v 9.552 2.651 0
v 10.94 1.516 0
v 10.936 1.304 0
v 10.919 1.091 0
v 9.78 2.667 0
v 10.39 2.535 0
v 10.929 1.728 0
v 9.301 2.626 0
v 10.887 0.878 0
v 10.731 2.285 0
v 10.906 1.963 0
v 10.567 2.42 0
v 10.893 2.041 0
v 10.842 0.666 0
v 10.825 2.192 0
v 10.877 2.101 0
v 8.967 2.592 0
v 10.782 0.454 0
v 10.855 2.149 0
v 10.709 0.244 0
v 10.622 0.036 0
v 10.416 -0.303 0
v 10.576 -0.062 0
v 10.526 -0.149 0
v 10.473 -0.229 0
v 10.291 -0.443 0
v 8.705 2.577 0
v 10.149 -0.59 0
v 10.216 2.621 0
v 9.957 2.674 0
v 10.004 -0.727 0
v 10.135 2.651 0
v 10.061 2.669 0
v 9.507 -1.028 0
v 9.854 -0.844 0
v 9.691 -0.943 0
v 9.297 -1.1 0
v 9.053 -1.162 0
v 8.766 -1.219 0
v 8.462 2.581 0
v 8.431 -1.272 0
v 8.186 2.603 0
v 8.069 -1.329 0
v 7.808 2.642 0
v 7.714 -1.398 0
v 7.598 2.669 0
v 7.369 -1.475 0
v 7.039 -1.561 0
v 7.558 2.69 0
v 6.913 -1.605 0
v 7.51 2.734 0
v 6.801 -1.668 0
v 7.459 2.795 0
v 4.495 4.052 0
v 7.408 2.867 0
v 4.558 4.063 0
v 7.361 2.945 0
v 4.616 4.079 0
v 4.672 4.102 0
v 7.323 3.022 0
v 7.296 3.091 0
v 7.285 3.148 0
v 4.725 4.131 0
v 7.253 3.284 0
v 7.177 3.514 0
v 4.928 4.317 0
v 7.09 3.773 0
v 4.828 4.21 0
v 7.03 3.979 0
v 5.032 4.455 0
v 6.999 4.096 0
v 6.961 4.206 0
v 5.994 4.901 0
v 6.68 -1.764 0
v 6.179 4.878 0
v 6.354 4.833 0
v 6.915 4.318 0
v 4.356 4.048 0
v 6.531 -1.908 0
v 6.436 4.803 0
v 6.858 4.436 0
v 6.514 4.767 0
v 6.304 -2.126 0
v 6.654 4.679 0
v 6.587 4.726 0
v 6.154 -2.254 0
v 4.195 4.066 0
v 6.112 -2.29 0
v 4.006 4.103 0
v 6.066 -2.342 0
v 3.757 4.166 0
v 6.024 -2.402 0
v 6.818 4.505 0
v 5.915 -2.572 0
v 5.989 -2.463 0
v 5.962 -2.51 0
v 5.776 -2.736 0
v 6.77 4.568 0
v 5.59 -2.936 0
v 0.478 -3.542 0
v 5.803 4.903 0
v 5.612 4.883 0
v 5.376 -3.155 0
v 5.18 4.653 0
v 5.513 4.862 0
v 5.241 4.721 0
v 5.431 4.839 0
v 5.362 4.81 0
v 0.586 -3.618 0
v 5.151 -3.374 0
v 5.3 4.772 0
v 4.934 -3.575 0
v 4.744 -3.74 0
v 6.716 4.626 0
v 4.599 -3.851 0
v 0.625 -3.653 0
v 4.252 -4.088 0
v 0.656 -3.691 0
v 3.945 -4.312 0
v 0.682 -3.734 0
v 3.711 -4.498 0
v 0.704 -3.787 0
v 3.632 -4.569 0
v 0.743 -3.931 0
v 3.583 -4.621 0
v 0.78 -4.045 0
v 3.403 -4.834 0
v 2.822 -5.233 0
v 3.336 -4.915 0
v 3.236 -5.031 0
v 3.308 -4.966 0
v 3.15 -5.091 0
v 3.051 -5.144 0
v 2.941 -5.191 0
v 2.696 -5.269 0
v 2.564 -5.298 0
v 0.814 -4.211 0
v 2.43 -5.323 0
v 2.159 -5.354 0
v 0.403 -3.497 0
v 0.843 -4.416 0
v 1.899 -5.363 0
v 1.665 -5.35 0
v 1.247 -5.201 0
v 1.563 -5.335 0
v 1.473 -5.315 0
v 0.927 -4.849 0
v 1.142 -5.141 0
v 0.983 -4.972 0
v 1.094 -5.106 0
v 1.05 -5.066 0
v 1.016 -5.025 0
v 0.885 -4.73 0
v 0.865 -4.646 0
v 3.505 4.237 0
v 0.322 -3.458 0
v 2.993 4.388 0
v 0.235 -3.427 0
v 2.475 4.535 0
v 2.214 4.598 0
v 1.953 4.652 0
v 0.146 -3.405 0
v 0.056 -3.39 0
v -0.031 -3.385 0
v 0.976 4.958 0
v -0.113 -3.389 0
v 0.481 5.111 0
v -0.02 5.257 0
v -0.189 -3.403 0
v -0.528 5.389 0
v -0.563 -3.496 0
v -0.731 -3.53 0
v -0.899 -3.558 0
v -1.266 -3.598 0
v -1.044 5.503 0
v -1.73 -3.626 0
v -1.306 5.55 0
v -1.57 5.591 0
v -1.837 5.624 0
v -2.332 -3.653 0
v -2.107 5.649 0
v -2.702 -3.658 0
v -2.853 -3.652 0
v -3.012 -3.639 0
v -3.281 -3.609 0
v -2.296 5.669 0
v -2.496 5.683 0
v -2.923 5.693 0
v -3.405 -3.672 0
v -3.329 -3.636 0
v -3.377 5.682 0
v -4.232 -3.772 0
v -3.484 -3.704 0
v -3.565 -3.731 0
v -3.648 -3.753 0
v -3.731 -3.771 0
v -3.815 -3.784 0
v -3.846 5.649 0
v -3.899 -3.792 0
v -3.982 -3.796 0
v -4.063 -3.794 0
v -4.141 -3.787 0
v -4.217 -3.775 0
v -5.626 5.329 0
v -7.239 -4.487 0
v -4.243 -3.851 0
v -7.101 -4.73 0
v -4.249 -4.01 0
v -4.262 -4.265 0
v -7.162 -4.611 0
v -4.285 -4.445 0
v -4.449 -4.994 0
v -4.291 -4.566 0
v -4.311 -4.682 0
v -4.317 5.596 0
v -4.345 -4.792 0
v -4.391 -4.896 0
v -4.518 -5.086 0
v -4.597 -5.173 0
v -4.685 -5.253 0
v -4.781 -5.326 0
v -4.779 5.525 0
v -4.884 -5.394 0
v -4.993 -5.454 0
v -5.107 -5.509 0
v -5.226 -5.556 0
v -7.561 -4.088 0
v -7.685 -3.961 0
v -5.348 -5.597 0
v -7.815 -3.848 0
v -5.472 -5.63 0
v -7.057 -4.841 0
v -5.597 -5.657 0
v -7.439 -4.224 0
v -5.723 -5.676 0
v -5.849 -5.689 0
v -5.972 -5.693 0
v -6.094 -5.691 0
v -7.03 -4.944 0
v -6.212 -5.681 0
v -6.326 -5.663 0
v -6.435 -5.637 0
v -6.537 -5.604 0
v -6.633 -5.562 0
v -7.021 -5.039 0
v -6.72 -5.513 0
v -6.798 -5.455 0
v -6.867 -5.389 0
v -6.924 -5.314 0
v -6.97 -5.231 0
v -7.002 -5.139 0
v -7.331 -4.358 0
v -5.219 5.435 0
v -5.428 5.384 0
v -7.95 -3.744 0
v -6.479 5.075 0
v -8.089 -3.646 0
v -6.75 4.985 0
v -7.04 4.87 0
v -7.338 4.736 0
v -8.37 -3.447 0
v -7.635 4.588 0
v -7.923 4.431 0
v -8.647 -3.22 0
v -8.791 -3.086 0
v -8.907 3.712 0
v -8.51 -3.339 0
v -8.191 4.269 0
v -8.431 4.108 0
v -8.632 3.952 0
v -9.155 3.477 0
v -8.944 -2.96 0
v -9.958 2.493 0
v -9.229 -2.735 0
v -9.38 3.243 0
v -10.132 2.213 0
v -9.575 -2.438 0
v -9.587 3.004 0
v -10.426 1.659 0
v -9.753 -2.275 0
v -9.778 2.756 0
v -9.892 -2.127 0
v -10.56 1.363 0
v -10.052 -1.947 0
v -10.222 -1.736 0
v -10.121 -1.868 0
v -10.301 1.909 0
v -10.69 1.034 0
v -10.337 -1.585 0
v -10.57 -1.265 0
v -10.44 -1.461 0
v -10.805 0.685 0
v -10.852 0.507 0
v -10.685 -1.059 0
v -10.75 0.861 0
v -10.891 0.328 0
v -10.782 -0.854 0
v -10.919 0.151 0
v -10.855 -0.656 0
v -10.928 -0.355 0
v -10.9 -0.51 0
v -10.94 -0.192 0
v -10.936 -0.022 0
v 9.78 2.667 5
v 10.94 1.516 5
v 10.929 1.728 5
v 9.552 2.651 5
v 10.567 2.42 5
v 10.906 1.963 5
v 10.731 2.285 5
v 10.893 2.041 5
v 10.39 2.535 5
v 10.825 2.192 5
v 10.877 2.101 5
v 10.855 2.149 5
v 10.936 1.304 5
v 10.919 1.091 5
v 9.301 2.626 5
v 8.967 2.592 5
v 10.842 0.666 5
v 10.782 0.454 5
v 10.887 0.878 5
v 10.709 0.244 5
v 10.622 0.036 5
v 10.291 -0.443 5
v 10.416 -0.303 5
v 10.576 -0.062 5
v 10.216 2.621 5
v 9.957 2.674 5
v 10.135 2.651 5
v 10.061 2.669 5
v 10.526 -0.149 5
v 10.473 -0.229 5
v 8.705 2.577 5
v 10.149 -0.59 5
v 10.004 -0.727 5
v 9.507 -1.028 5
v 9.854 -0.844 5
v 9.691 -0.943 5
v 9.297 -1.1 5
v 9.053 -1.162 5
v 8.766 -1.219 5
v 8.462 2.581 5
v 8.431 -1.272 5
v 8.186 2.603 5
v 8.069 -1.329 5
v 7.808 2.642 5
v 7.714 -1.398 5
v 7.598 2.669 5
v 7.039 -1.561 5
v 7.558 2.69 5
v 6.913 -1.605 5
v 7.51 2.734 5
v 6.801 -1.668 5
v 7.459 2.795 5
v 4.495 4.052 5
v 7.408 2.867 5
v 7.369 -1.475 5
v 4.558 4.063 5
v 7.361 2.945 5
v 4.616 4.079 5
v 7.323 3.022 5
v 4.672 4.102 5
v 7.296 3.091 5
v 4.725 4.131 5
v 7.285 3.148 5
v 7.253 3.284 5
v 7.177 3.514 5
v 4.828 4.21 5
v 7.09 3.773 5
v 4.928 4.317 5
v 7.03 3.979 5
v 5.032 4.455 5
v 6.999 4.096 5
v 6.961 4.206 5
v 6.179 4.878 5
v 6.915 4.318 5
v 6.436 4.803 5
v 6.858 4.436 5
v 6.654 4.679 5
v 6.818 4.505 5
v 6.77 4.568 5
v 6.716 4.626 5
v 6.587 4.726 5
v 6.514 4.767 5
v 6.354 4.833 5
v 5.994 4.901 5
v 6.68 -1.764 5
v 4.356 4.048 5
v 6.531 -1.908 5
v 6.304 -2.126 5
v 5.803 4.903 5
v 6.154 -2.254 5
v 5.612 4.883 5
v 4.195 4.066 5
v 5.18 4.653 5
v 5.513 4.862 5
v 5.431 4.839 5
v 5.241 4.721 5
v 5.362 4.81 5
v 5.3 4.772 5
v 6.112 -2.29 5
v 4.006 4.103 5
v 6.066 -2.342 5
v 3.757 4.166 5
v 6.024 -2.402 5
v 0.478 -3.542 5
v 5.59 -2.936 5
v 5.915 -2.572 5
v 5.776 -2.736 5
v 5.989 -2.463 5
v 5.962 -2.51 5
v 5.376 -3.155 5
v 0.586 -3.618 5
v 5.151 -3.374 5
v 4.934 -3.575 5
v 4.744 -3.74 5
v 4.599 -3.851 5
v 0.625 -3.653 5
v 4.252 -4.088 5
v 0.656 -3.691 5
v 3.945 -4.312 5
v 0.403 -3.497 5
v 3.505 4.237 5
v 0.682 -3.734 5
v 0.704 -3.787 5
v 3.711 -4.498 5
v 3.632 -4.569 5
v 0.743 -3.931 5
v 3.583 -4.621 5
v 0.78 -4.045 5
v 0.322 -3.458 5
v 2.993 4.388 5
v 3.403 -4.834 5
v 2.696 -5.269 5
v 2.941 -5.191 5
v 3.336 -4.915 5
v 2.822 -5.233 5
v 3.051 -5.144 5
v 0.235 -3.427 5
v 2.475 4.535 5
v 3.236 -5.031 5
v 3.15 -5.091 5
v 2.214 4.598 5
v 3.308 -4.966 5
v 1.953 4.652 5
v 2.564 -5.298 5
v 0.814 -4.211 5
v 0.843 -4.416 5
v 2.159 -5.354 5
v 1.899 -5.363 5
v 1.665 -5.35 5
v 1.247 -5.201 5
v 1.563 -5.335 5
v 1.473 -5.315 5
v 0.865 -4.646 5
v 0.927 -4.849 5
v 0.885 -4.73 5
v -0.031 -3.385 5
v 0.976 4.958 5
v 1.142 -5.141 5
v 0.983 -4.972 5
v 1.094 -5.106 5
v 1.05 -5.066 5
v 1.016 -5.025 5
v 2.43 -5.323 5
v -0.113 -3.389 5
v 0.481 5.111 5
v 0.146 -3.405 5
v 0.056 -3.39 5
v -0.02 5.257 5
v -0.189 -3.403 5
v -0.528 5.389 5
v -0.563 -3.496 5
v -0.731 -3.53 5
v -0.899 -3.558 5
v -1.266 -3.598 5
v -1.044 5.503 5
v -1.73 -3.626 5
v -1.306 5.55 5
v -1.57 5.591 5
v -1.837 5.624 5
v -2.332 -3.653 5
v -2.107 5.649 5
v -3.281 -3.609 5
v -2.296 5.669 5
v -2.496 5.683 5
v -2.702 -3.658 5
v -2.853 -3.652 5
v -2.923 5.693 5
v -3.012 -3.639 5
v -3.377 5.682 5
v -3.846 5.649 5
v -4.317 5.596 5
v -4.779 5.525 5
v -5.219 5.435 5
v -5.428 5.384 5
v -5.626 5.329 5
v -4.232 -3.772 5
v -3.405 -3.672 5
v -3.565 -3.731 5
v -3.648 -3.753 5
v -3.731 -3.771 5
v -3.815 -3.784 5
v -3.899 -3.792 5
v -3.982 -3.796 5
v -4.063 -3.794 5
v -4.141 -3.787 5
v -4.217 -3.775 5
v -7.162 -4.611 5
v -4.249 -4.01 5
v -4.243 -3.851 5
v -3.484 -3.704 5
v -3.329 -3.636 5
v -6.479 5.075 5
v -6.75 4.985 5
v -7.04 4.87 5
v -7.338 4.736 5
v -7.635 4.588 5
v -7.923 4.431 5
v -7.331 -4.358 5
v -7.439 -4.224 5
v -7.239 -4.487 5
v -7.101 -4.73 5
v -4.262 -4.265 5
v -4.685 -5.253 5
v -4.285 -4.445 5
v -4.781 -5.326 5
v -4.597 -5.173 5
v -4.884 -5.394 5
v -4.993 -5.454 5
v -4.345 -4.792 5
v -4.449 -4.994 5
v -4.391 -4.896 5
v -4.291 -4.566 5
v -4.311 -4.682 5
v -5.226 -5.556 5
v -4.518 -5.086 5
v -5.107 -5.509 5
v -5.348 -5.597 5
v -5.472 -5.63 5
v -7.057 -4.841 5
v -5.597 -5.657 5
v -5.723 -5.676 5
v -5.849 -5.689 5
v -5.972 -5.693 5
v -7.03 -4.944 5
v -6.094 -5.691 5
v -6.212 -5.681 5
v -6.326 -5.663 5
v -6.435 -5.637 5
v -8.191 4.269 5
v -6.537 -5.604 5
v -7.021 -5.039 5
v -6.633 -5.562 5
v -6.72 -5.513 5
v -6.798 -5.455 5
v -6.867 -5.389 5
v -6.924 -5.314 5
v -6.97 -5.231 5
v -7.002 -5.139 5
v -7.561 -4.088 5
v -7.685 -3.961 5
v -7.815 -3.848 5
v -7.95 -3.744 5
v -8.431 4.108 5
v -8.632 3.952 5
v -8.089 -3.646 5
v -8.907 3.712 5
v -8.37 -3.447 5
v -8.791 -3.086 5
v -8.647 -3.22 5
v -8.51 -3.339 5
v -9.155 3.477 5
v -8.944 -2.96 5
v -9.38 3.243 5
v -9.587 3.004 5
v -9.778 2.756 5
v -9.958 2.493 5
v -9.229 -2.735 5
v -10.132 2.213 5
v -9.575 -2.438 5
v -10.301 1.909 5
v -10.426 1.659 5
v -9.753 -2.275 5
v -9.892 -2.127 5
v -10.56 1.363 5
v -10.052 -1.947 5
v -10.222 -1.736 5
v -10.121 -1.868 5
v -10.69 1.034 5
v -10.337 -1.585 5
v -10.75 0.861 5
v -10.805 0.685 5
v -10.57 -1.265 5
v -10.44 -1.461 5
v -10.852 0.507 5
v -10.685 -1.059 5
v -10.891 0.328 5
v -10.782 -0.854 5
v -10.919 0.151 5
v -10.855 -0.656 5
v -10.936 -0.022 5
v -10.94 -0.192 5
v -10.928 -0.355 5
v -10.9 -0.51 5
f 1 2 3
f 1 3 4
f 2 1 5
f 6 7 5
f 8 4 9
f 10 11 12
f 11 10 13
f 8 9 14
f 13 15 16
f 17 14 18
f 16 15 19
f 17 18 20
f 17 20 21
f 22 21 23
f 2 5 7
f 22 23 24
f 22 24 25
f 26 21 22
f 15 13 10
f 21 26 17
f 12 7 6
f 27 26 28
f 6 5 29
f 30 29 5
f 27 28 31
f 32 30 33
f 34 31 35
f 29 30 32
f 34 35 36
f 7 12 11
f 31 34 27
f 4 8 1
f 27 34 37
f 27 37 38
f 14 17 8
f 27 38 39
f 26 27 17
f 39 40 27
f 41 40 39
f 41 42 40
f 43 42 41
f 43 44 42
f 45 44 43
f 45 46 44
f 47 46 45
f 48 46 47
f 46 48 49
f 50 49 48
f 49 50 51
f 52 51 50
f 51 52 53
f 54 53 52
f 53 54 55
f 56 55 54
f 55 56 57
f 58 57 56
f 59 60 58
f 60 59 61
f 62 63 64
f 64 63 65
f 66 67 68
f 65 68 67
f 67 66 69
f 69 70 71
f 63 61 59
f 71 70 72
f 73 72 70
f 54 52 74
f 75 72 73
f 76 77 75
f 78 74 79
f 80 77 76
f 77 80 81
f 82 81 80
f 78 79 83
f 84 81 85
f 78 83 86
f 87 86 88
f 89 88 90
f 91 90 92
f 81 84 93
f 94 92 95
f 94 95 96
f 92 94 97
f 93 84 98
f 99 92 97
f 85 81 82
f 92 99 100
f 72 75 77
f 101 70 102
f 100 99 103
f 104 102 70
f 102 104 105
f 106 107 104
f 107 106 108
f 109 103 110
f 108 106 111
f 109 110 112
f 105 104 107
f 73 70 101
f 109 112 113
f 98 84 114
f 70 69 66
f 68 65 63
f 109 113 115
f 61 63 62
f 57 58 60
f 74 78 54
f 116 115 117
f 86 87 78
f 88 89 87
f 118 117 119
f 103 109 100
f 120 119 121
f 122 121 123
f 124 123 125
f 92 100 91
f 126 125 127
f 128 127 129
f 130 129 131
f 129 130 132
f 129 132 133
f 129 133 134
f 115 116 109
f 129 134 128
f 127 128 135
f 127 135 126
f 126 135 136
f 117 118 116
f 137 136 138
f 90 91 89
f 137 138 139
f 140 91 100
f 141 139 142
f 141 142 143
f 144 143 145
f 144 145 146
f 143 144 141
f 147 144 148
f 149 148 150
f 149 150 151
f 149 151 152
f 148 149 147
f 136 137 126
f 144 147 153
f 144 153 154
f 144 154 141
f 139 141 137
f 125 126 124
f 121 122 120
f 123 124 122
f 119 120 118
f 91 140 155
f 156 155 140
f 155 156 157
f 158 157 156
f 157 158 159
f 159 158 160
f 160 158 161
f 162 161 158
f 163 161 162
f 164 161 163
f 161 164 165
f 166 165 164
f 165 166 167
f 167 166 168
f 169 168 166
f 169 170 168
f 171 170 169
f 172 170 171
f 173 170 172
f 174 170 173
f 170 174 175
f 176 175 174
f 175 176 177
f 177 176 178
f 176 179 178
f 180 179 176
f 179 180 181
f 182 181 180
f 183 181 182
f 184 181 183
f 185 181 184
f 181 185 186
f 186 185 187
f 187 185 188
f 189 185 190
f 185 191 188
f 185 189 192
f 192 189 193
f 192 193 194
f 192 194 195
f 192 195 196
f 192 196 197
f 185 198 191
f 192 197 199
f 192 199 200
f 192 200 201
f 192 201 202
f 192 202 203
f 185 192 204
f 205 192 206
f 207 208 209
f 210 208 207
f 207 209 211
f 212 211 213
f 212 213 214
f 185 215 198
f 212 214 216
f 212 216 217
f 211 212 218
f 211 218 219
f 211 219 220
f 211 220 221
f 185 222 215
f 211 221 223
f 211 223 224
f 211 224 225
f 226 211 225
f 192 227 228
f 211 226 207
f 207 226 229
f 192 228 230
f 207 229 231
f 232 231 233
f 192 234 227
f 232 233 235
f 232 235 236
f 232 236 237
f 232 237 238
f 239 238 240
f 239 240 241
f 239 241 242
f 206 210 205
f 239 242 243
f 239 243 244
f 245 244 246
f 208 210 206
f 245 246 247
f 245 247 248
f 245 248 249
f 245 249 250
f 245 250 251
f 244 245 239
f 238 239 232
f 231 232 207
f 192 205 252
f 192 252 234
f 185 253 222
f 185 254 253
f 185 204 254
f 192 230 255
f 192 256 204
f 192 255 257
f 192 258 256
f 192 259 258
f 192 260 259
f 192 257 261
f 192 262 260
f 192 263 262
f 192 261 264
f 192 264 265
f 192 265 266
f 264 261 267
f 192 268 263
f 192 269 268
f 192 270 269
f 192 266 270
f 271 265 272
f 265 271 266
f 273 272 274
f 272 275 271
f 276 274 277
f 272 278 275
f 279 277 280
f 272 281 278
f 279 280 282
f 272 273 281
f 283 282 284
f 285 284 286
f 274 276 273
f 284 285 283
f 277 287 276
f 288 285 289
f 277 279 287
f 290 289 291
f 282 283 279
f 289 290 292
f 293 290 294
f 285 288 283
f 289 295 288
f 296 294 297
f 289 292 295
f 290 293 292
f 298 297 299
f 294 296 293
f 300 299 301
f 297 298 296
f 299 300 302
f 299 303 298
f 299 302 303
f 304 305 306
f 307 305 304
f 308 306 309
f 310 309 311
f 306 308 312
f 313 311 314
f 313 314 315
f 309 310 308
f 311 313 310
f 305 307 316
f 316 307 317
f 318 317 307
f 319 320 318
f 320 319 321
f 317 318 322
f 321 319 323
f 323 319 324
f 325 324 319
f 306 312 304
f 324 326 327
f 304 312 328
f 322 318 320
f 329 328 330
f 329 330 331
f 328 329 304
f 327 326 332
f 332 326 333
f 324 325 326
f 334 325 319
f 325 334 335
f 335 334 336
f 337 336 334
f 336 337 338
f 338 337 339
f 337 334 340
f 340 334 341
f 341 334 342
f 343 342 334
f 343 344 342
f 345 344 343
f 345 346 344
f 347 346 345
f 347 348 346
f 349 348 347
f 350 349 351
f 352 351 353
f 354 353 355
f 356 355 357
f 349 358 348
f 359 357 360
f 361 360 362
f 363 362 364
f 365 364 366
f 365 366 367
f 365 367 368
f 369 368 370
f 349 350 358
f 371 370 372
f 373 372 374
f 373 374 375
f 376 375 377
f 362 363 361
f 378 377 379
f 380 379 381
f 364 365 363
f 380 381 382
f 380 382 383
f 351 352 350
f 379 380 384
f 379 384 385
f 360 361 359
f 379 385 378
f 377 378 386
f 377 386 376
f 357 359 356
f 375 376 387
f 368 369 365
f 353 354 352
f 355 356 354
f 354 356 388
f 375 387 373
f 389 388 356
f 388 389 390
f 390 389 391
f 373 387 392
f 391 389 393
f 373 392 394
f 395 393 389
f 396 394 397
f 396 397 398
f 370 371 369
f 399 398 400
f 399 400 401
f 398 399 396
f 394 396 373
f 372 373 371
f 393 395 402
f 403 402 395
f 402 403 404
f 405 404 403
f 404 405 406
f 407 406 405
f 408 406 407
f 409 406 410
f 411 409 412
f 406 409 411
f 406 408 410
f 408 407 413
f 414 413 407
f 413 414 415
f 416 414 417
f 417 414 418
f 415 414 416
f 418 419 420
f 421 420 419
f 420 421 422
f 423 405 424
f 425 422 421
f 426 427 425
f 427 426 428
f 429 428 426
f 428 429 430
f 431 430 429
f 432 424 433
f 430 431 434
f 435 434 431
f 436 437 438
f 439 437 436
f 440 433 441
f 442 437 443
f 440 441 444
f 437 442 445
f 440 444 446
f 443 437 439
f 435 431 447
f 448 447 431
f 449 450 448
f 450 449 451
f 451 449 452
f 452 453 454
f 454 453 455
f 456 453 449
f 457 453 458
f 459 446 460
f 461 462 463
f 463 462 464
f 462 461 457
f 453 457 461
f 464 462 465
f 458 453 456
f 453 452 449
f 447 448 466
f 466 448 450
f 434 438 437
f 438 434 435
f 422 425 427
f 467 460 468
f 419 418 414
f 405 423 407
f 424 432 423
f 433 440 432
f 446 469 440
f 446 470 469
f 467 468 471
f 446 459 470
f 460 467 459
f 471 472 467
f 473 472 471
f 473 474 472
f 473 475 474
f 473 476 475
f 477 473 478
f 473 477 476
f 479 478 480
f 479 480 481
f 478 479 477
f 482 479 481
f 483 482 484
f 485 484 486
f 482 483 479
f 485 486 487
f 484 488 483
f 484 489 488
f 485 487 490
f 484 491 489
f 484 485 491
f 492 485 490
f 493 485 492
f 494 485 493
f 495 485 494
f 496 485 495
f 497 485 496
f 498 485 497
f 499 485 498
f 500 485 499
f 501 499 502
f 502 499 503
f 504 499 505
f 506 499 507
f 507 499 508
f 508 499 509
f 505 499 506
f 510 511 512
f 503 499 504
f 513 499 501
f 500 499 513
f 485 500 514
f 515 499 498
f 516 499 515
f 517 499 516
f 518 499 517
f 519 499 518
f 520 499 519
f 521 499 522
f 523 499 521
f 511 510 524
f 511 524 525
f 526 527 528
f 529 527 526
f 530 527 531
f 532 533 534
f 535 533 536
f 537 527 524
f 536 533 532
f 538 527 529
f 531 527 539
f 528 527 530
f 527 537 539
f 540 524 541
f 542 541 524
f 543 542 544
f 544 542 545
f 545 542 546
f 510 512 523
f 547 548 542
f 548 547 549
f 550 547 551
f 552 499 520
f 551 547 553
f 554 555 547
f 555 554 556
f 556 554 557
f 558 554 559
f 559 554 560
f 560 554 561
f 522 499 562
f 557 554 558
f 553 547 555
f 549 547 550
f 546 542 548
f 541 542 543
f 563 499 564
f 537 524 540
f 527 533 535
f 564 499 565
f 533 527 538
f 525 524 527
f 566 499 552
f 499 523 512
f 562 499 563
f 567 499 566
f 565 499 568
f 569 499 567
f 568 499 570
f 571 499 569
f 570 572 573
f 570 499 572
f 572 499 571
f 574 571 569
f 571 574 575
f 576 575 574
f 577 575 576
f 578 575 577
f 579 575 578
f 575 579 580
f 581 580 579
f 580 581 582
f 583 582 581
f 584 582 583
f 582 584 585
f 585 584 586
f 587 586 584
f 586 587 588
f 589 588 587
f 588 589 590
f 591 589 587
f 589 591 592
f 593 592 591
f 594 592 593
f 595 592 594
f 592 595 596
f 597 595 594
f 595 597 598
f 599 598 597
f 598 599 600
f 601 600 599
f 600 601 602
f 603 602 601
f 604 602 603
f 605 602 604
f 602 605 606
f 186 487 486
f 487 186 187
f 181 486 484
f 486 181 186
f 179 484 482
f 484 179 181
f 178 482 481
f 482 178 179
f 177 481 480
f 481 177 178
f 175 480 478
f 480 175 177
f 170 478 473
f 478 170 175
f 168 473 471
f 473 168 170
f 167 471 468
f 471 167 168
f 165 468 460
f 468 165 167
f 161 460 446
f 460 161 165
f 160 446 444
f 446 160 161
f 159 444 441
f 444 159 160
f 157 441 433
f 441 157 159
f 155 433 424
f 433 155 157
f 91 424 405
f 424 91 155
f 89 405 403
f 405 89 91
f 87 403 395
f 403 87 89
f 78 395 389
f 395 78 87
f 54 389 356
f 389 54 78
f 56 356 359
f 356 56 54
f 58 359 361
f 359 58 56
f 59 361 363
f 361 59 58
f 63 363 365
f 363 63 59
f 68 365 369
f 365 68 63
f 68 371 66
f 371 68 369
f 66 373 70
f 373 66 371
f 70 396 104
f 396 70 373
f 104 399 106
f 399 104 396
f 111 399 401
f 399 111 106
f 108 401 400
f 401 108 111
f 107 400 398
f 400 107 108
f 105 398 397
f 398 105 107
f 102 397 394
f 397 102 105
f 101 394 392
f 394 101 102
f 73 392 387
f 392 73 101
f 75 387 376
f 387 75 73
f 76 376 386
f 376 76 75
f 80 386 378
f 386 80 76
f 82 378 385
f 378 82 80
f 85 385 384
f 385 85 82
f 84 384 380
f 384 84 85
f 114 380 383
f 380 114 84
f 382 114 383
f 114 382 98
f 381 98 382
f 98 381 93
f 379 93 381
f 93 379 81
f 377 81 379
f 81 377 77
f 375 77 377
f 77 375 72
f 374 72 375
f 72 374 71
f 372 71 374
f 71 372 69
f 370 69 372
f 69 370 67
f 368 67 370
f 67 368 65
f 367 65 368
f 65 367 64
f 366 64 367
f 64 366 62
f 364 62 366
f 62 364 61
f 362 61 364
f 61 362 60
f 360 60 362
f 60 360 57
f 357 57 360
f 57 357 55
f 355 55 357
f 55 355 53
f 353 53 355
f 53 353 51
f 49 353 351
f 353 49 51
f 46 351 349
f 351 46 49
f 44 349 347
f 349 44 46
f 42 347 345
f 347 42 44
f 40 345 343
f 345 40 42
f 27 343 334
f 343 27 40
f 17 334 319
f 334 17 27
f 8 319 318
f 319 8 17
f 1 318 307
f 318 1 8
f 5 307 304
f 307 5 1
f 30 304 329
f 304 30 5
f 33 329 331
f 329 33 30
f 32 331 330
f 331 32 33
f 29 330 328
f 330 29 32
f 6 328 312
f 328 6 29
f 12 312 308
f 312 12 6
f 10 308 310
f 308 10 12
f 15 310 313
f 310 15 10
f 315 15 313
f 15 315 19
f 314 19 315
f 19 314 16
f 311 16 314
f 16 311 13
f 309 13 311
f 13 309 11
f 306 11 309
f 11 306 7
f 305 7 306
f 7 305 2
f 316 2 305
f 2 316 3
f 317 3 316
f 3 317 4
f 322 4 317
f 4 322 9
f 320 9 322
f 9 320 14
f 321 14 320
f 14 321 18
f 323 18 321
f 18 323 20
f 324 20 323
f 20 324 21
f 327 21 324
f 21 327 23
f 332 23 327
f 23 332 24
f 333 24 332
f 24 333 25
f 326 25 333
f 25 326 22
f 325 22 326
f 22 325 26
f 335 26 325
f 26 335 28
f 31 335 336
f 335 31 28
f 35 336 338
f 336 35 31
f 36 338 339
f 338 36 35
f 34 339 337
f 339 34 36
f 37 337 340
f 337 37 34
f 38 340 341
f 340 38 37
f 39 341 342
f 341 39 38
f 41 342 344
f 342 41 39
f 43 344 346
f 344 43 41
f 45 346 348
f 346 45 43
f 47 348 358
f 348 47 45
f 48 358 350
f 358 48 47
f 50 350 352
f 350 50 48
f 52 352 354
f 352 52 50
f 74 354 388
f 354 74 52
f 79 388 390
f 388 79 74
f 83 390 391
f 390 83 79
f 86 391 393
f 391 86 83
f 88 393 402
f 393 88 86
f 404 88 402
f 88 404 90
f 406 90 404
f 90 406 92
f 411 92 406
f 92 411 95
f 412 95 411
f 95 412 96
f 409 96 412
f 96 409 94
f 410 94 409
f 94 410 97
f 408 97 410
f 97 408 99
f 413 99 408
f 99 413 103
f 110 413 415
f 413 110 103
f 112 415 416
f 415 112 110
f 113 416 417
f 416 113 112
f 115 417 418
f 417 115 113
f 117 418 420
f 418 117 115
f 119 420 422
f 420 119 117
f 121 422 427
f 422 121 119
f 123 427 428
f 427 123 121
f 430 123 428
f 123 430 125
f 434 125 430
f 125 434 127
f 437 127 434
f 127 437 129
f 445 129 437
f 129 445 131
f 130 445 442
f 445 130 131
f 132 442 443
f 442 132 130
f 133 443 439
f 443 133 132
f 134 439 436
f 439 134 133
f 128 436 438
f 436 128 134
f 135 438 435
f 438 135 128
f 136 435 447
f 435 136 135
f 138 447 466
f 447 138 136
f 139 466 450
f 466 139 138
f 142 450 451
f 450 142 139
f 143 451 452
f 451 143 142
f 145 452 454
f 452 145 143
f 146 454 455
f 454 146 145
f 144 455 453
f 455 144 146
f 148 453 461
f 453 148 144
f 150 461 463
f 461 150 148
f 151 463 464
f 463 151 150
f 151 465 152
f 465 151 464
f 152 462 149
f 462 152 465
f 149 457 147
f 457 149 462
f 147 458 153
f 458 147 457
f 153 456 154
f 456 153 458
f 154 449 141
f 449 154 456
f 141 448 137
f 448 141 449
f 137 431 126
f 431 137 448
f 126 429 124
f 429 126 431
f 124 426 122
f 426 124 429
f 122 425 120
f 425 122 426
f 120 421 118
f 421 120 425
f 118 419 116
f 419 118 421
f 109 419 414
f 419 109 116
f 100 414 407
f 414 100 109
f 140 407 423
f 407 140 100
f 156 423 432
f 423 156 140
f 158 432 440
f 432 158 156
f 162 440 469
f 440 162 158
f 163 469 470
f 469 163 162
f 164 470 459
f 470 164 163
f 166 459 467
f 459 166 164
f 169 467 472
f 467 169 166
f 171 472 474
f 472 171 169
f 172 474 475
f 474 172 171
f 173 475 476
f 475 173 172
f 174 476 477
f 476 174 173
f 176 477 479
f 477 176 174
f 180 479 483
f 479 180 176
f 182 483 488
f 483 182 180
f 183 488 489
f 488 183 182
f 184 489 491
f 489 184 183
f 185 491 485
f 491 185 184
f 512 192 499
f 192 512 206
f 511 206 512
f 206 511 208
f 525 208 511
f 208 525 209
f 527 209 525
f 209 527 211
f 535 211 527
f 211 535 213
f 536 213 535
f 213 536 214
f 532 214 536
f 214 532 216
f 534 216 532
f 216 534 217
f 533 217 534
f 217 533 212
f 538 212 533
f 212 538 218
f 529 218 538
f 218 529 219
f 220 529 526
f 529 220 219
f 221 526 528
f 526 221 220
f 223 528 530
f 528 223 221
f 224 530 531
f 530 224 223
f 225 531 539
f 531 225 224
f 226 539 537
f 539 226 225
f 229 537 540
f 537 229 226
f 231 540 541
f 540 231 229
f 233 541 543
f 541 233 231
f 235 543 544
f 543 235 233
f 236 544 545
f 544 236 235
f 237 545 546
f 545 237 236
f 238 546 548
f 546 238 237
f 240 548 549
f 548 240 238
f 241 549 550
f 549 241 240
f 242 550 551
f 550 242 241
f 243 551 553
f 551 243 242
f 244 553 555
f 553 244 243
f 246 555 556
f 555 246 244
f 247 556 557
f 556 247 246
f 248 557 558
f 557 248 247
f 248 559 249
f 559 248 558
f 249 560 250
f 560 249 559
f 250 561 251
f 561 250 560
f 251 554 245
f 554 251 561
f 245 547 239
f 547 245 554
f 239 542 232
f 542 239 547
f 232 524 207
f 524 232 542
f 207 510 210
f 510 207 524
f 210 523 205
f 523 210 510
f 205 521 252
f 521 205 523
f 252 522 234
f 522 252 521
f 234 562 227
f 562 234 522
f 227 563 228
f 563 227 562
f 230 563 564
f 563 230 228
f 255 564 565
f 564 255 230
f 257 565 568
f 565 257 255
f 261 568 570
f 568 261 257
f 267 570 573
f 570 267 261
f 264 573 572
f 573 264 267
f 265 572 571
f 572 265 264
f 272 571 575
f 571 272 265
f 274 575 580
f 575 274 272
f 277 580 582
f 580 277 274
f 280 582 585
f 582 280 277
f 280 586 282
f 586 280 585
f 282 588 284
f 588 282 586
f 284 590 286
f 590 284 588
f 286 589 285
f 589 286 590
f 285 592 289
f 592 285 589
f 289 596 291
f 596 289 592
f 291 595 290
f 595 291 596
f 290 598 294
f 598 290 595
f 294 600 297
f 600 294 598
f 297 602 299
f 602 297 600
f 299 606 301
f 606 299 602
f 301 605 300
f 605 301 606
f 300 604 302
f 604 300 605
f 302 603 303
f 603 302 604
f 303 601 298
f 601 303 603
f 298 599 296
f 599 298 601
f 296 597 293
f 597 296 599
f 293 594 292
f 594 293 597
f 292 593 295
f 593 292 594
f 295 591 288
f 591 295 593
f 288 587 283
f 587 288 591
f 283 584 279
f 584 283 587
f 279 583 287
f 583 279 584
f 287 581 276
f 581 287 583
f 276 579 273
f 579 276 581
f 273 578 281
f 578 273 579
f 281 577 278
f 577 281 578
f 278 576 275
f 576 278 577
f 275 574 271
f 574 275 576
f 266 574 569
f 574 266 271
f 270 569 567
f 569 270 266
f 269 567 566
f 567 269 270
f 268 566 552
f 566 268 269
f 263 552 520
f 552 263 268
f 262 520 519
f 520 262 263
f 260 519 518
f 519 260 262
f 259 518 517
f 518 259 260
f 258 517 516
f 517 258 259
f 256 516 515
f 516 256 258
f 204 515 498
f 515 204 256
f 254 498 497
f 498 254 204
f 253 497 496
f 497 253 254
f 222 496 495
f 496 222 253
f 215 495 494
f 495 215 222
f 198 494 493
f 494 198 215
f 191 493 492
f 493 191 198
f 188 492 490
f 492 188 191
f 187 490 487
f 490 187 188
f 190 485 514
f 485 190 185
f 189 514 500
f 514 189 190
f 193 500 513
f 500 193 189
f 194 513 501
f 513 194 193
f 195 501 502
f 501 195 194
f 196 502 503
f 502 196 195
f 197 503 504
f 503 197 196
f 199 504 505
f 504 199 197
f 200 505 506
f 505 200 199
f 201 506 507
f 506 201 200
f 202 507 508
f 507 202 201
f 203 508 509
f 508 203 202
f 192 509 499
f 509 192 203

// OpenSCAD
module svg()
{
    
// Module names are of the form poly_<inkscape-path-id>().
// As a result you can associate a polygon in this OpenSCAD program with the
//  corresponding SVG element in the Inkscape document by looking for 
//  the XML element with the attribute id="inkscape-path-id".

// Paths have their own variables so they can be imported and used 
//  in polygon(points) structures in other programs.
// The NN_points is the list of all polygon XY vertices. 
// There may be an NN_paths variable as well. If it exists then it 
//  defines the nested paths. Both must be used in the 
//  polygon(points, paths) variant of the command.

profile_scale = 25.4/90; //made in inkscape in mm

// helper functions to determine the X,Y dimensions of the profiles
function min_x(shape_points) = min([ for (x = shape_points) min(x[0])]);
function max_x(shape_points) = max([ for (x = shape_points) max(x[0])]);
function min_y(shape_points) = min([ for (x = shape_points) min(x[1])]);
function max_y(shape_points) = max([ for (x = shape_points) max(x[1])]);

height = 10;
width = 1.0;


path825_0_points = [[-165.860705,119.023919],[-166.074297,116.790142],[-166.706860,114.348763],[-167.746073,111.721491],[-169.179617,108.930035],[-170.995172,105.996104],[-173.180418,102.941407],[-175.723036,99.787652],[-178.610705,96.556549],[-181.531131,93.573066],[-184.606005,90.904119],[-187.798993,88.452594],[-191.073759,86.121378],[-197.723281,81.431418],[-201.025366,78.878446],[-204.263885,76.057329],[-207.662717,72.893163],[-211.270594,69.921640],[-218.014315,64.604839],[-226.185285,57.592919],[-230.376752,53.736875],[-233.679148,50.241769],[-237.455335,46.003679],[-239.088742,44.122429],[-241.461477,41.003679],[-244.169995,37.447307],[-246.610705,34.513899],[-249.685518,29.872830],[-252.410991,25.021370],[-254.685239,20.163620],[-256.406371,15.503679],[-257.487891,12.055254],[-258.144854,8.385125],[-258.414005,4.531126],[-258.332088,0.531091],[-257.935847,-3.577145],[-257.262025,-7.755749],[-256.347368,-11.966886],[-255.228618,-16.172723],[-253.942521,-20.335426],[-252.525819,-24.417159],[-249.447581,-32.186384],[-246.287855,-39.177726],[-243.340594,-45.088511],[-239.330296,-52.270471],[-235.239968,-58.901016],[-230.978480,-65.091701],[-226.454705,-70.954077],[-221.577513,-76.599698],[-216.255777,-82.140117],[-210.398367,-87.686887],[-203.914155,-93.351561],[-199.147460,-97.034638],[-193.485338,-100.843263],[-187.148146,-104.662457],[-180.356243,-108.377237],[-173.329986,-111.872625],[-166.289734,-115.033639],[-159.455845,-117.745299],[-153.048675,-119.892625],[-132.899865,-125.876586],[-128.209835,-127.180376],[-123.287058,-128.388391],[-112.884976,-130.504200],[-101.977047,-132.198230],[-90.846700,-133.444695],[-79.777364,-134.217812],[-69.052468,-134.491796],[-58.955438,-134.240862],[-54.230946,-133.910493],[-49.769705,-133.439226],[-43.395450,-132.855554],[-37.088858,-132.073466],[-30.846285,-131.110096],[-24.664088,-129.982579],[-12.466245,-127.303642],[-0.466180,-124.173735],[11.365256,-120.729935],[23.057215,-117.109322],[46.139295,-109.885967],[52.299969,-108.624454],[58.453993,-107.119684],[70.699292,-103.662135],[82.789592,-100.076840],[88.749868,-98.412388],[94.639295,-96.927321],[99.102267,-96.048819],[102.908861,-95.633343],[106.182491,-95.723181],[107.658011,-95.970809],[109.046570,-96.360624],[110.363594,-96.897913],[111.624510,-97.587961],[114.039725,-99.447479],[116.415629,-101.981469],[118.875635,-105.232220],[122.355721,-109.913987],[123.798395,-111.507977],[125.193423,-112.715427],[126.653756,-113.619877],[128.292342,-114.304866],[130.222131,-114.853937],[132.556075,-115.350630],[137.083365,-115.815214],[141.589194,-115.776050],[145.963120,-115.230005],[150.094701,-114.173950],[152.035099,-113.453690],[153.873495,-112.604753],[155.596085,-111.626747],[157.189062,-110.519282],[158.638622,-109.281966],[159.930959,-107.914408],[161.052268,-106.416215],[161.988745,-104.786998],[163.340739,-101.990149],[164.432718,-99.359894],[165.321603,-96.745522],[166.064315,-93.996321],[167.481535,-89.115071],[169.539735,-82.996321],[171.328172,-77.575507],[172.096835,-74.372271],[172.346151,-73.025307],[172.972523,-71.374964],[173.883583,-69.563045],[174.986963,-67.731353],[176.190298,-66.021694],[177.401219,-64.575869],[178.527361,-63.535684],[179.476355,-63.042941],[184.448008,-62.398161],[193.363815,-61.476751],[199.888469,-60.973828],[205.631245,-60.879895],[211.826308,-61.220449],[219.707825,-62.020991],[225.647723,-62.617144],[231.013507,-63.011256],[235.215933,-63.169321],[237.665755,-63.057331],[239.406806,-62.613546],[241.312178,-61.917053],[245.422337,-59.876942],[249.609143,-57.158983],[253.485505,-53.985161],[255.697615,-51.777422],[256.412335,-50.769222],[256.935595,-49.628881],[257.319466,-48.209459],[257.616024,-46.364017],[258.155485,-40.807311],[258.414005,-35.810147],[258.336682,-30.793669],[257.925304,-25.767757],[257.181658,-20.742287],[256.107534,-15.727138],[254.704720,-10.732187],[252.975004,-5.767312],[250.920175,-0.842391],[249.826863,1.458985],[248.653867,3.521107],[247.397630,5.398699],[246.054597,7.146485],[243.093921,10.471536],[239.743395,13.934049],[236.319902,17.184614],[232.766159,19.946323],[228.911765,22.286802],[224.586322,24.273675],[219.619431,25.974569],[213.840694,27.457107],[207.079712,28.788916],[199.166085,30.037619],[190.612942,31.403105],[182.214782,33.011985],[174.066848,34.844450],[166.264385,36.880689],[163.301829,37.913230],[160.646056,39.395897],[157.799447,41.668287],[154.264385,45.069999],[148.921213,50.228930],[145.378185,53.249859],[144.371366,54.103227],[143.301527,55.319087],[142.296447,56.735343],[141.483905,58.189899],[140.826487,59.283108],[139.730916,60.755228],[136.441405,64.620576],[132.047549,69.354701],[126.981525,74.526360],[121.675509,79.704311],[116.561681,84.457309],[112.072217,88.354113],[108.639295,90.963479],[100.432980,96.565552],[93.179361,101.860165],[87.655709,106.257721],[85.785517,107.935852],[84.639295,109.168619],[80.389295,114.192389],[78.797968,116.095900],[78.131595,117.299129],[76.442530,118.845185],[74.404345,120.248280],[72.062714,121.509617],[69.463313,122.630396],[66.651816,123.611819],[63.673898,124.455085],[60.575233,125.161397],[57.401497,125.731955],[51.011508,126.470615],[44.869330,126.680672],[39.340359,126.371734],[36.920014,126.025644],[34.789995,125.553409],[29.455420,122.860509],[26.984652,121.438514],[25.847849,120.609406],[24.795605,119.663759],[23.992384,118.692943],[23.228116,117.452859],[21.886271,114.550312],[20.909738,111.726969],[20.438185,109.753679],[19.917406,104.306724],[19.227296,99.472293],[18.419677,95.553272],[17.546375,92.852549],[16.626745,89.453958],[16.111980,88.215232],[15.504081,87.184845],[14.760674,86.288767],[13.839386,85.452967],[11.293665,83.666079],[9.530095,82.595953],[7.595657,81.690977],[5.546483,80.962846],[3.438708,80.423259],[1.328465,80.083913],[-0.728112,79.956504],[-2.674890,80.052731],[-4.455735,80.384289],[-13.289018,82.581646],[-17.279083,83.388358],[-21.247999,84.038450],[-29.912091,84.982849],[-40.860705,85.642989],[-55.097145,86.281996],[-63.825228,86.416844],[-67.404402,86.270075],[-71.143405,85.967104],[-81.150125,84.852349],[-95.939555,83.138079],[-98.101165,85.299699],[-99.199039,86.681967],[-99.875739,88.428803],[-100.234940,90.969287],[-100.380315,94.732499],[-100.678039,100.749020],[-101.228715,105.003679],[-101.356790,107.864547],[-101.830255,110.594210],[-102.626775,113.190156],[-103.724015,115.649876],[-105.099641,117.970860],[-106.731318,120.150598],[-108.596713,122.186580],[-110.673489,124.076297],[-112.939312,125.817238],[-115.371849,127.406893],[-117.948763,128.842753],[-120.647721,130.122307],[-123.446388,131.243046],[-126.322430,132.202459],[-129.253511,132.998037],[-132.217297,133.627269],[-135.191453,134.087647],[-138.153645,134.376659],[-141.081539,134.491796],[-143.952799,134.430548],[-146.745091,134.190405],[-149.436080,133.768857],[-152.003432,133.163394],[-154.424812,132.371506],[-156.677885,131.390684],[-158.740317,130.218417],[-160.589773,128.852195],[-162.203919,127.289509],[-163.560420,125.527848],[-164.636941,123.564703],[-165.411148,121.397563],[-165.860705,119.023919],[-165.860705,119.023919]];

module poly_path825(h, w, res=4)  {
  scale([profile_scale, -profile_scale, 1])
  union()  {
    linear_extrude(height=h)
      polygon(path825_0_points);
  }
}

// The shapes
poly_path825(height, width);


}


module pigglet()
{
    scale([0.1,0.1,0.5]) svg();
}

module pig()
{
    scale([0.15,0.15,0.5]) svg();
    //scale([0.2,0.2,0.5]) svg();
}


color([0.2,0.2,0.2])pig();
color([0.3,0.3,0.3])pigglet();
